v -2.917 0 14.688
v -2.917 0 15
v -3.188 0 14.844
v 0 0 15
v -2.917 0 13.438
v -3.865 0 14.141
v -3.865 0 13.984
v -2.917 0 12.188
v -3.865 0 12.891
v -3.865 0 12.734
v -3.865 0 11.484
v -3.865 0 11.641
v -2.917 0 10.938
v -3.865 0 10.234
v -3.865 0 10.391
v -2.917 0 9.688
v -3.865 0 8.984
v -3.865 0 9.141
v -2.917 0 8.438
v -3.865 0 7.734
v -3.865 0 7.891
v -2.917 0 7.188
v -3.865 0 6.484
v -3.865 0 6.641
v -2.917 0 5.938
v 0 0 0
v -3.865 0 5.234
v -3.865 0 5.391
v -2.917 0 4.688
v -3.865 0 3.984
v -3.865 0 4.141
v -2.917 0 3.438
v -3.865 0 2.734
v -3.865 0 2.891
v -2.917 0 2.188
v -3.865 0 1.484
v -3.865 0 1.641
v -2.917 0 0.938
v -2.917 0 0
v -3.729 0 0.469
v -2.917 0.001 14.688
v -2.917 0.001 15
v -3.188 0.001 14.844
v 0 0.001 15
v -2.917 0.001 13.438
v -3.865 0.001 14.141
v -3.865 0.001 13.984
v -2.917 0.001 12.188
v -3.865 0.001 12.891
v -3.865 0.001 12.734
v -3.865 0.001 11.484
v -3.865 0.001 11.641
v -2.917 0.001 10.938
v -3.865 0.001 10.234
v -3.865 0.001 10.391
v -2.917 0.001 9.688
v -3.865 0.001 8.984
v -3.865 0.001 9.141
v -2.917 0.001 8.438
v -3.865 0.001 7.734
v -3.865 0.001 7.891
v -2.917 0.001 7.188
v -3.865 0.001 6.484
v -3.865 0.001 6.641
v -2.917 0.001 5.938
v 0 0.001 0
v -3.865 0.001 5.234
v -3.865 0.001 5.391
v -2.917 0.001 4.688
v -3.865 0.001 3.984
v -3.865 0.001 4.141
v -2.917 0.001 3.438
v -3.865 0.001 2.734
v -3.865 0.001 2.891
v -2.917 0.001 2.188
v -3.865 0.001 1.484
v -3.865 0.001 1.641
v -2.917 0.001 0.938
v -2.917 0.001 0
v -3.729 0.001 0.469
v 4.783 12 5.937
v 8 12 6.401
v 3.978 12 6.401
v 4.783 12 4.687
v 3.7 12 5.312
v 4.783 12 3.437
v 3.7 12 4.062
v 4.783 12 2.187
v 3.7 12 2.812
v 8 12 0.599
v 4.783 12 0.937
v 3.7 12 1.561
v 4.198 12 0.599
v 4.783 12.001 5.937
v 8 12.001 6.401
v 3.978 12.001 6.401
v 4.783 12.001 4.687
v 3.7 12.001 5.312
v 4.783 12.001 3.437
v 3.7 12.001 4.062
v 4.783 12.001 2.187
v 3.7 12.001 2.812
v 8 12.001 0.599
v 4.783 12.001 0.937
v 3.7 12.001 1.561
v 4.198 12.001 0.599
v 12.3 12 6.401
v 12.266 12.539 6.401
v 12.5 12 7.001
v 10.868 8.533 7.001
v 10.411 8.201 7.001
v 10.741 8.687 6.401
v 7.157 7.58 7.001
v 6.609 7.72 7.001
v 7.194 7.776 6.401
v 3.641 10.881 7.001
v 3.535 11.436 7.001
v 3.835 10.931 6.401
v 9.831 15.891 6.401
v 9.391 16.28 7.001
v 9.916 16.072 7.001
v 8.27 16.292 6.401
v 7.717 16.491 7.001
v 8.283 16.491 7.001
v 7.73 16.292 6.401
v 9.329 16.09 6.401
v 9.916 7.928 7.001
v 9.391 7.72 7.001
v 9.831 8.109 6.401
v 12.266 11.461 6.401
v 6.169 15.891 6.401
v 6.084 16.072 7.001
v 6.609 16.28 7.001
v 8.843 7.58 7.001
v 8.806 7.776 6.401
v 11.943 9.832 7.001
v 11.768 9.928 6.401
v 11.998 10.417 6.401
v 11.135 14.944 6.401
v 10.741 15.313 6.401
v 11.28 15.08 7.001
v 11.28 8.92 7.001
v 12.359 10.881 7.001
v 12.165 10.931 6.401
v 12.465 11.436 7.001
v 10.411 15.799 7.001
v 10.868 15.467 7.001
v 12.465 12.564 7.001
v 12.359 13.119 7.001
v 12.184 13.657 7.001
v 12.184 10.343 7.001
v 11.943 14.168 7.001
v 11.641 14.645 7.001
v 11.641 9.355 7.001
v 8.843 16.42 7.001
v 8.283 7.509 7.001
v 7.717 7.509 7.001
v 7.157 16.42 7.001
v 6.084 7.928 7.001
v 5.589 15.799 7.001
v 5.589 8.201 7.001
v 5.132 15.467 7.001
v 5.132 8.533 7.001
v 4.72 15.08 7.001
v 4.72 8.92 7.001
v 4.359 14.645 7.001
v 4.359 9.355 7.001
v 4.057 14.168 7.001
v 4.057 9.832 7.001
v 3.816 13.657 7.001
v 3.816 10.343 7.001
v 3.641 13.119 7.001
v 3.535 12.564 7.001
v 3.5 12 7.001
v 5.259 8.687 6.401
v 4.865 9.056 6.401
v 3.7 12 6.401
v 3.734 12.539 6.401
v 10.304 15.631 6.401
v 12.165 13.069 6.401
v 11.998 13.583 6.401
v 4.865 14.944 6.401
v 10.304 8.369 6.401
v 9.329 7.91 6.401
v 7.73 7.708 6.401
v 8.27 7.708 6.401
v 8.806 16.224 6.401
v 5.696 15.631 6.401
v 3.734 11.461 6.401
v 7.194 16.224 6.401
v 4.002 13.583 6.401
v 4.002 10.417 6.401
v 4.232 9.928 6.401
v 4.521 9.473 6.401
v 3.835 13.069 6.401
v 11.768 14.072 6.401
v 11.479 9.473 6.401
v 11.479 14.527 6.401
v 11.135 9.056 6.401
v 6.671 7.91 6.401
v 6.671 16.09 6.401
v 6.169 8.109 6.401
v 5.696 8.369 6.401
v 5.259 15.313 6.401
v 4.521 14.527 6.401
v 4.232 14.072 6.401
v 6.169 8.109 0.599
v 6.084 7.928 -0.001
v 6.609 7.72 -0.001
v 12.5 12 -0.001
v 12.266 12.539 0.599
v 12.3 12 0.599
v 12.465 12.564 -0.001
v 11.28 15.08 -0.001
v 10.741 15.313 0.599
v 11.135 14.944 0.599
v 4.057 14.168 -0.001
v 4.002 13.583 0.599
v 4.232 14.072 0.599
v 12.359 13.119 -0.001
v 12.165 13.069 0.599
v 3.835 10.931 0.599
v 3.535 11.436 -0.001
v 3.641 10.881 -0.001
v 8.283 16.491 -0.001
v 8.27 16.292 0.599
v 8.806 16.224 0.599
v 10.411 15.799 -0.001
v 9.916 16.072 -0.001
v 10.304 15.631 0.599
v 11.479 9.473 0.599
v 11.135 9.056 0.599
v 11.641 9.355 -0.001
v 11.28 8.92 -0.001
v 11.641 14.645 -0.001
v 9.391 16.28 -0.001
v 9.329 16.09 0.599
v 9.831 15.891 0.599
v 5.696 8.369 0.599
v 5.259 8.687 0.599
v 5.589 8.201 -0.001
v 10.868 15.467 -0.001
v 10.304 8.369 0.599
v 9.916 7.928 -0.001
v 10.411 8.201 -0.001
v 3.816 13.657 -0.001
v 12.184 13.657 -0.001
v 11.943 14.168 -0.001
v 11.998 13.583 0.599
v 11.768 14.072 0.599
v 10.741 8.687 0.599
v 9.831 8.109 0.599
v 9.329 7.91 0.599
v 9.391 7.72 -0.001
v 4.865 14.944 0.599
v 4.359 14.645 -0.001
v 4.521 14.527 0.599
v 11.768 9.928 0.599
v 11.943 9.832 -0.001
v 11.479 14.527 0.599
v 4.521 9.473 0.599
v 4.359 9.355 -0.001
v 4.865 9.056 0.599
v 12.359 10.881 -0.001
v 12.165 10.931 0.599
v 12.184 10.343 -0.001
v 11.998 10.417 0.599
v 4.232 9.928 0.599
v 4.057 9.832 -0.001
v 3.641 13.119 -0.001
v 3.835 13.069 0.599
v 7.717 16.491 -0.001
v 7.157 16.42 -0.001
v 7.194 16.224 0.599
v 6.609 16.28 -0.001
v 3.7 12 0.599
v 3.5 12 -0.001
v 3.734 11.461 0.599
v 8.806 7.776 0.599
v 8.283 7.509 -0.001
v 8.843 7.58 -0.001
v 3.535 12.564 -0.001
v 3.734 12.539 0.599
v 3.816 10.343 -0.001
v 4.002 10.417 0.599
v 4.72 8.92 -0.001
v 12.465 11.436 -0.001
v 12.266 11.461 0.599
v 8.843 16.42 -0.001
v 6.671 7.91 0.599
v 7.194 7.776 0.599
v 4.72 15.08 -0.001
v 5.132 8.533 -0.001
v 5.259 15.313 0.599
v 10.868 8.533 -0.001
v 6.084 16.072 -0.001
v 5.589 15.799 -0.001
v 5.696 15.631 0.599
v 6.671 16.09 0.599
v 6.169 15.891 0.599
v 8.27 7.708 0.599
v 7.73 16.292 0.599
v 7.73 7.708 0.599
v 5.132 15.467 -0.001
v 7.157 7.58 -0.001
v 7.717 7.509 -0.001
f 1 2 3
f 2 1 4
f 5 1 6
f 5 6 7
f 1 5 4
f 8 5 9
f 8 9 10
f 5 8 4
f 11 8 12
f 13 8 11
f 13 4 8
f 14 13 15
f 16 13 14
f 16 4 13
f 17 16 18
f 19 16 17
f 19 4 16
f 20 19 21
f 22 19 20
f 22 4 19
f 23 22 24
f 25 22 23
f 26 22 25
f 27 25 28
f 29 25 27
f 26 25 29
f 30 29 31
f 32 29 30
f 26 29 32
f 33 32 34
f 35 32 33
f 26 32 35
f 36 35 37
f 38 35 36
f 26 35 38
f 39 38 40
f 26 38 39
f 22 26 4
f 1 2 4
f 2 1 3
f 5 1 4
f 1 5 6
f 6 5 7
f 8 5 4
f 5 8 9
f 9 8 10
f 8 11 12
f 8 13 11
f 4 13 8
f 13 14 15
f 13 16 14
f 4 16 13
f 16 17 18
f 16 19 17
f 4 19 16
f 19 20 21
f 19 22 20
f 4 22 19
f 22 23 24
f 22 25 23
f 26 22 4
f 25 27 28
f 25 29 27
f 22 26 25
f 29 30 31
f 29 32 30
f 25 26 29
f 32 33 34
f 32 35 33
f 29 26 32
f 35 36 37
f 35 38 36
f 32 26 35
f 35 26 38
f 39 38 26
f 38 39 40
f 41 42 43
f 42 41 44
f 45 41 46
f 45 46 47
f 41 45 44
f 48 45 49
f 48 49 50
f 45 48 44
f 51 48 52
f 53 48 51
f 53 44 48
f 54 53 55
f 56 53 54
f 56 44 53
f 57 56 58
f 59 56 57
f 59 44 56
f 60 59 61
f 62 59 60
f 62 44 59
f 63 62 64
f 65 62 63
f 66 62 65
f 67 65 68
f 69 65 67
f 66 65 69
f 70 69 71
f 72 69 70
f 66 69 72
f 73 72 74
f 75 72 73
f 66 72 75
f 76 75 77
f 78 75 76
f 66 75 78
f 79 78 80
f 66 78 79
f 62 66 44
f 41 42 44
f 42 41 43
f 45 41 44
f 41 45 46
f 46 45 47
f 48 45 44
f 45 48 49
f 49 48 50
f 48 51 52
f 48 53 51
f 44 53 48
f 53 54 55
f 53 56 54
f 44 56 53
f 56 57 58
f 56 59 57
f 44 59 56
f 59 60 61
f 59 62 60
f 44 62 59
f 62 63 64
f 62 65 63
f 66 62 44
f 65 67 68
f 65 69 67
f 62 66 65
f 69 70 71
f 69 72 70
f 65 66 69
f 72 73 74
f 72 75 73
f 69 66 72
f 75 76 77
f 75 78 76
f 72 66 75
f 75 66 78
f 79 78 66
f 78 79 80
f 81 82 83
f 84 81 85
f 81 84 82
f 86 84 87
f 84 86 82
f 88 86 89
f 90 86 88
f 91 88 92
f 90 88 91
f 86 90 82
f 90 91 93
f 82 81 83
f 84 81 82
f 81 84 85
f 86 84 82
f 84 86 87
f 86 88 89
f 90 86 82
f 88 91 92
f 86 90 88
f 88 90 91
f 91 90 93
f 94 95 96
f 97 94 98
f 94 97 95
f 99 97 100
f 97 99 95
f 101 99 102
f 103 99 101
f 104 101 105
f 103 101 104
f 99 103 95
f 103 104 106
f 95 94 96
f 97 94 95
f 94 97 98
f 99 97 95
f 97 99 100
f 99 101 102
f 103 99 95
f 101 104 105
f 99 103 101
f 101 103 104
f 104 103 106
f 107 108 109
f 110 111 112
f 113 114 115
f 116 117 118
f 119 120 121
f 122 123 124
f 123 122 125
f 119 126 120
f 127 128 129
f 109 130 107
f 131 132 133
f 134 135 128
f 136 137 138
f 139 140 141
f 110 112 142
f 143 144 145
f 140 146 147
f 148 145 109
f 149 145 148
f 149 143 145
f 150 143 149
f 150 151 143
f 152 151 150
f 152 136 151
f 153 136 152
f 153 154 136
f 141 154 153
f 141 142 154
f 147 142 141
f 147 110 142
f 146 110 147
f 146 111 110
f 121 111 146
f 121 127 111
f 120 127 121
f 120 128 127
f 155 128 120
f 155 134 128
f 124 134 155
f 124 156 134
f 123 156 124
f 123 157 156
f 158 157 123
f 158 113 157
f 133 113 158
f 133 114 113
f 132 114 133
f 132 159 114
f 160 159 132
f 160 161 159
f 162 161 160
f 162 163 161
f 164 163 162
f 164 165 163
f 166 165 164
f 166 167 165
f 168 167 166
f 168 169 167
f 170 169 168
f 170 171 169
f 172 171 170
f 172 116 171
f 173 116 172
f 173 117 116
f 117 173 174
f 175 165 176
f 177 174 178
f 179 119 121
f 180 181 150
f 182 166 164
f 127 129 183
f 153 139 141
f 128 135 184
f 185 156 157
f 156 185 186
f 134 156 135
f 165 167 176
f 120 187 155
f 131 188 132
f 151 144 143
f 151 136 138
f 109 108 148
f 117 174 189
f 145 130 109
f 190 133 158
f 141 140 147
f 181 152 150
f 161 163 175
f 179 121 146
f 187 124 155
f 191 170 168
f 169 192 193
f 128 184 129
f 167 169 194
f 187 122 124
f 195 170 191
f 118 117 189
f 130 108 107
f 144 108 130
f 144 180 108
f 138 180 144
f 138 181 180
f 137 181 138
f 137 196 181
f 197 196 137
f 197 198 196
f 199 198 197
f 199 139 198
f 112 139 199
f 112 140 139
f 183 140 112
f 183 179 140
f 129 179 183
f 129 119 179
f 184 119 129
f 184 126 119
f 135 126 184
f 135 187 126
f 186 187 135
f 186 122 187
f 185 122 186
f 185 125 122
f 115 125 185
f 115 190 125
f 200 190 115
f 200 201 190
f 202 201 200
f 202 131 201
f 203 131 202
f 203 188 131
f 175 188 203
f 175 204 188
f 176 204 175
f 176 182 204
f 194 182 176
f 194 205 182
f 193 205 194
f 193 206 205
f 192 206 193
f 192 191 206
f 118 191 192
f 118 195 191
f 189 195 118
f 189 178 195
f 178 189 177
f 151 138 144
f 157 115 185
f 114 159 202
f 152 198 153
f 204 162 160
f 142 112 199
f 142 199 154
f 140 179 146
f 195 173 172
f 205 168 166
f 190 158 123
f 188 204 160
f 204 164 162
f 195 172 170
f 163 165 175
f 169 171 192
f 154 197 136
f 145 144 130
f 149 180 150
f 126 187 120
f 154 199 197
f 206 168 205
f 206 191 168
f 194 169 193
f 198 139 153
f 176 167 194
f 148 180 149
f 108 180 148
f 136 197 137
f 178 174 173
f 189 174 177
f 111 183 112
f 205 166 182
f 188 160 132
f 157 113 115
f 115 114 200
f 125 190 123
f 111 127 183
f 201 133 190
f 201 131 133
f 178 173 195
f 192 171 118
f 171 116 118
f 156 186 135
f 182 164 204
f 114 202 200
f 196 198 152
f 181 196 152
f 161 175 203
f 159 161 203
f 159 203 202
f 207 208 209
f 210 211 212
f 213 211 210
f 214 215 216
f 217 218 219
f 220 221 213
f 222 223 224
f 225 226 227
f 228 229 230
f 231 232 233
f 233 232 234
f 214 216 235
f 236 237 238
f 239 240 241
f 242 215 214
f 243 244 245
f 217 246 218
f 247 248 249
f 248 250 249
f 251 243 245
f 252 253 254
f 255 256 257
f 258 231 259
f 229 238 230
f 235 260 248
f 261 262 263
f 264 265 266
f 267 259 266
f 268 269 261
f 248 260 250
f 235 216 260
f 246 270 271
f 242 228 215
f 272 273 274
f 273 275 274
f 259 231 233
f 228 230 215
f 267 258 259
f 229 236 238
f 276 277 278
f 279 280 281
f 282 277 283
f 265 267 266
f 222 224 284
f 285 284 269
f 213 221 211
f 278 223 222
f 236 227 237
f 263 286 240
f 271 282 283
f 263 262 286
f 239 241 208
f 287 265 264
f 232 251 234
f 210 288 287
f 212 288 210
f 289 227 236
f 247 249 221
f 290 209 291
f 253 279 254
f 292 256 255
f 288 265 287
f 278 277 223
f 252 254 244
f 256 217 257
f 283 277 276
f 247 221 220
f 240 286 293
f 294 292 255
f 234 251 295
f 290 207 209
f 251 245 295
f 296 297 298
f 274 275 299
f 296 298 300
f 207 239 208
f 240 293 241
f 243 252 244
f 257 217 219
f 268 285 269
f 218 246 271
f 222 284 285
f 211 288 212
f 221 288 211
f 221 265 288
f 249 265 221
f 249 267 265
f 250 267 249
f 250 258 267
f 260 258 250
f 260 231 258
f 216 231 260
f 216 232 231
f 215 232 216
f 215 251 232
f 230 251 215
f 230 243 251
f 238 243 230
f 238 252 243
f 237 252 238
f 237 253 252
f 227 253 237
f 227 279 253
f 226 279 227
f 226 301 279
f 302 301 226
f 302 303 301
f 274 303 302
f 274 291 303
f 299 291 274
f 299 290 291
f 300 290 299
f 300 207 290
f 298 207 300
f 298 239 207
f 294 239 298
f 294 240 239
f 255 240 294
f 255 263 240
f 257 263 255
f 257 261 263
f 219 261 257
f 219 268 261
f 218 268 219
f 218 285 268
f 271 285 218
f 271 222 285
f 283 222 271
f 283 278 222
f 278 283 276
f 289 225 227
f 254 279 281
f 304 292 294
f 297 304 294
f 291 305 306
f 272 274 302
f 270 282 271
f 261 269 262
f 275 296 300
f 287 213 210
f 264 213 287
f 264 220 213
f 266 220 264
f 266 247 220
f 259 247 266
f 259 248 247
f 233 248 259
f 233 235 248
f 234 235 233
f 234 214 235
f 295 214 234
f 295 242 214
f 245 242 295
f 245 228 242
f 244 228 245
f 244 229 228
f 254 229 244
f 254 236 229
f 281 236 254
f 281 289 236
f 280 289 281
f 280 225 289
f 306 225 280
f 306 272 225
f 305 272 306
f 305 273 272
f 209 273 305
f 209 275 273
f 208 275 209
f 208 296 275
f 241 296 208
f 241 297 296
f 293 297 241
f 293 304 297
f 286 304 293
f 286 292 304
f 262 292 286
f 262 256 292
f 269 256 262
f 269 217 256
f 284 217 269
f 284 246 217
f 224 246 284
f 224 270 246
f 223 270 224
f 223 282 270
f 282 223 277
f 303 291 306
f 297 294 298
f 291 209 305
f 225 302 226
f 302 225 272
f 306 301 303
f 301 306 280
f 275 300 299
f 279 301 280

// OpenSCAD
/*
"OpenScad library. Threads for screws and nuts V1" 
by ANDRES ROMAN (AKA Cuiso) September 2018

-> V1.1 23/08/2019 Change Log:
-Fixed bug. Using fullparms functions with "divs" no divider of 360 (200 for example) the thread could be incomplete. Now you can use any number of "divs" without problem.
-A small improvement. Now the diameter reductions at the beginning of the screw for easy entry are created with the same level of detail as the rest of the screw.

* Copyright 2018 ANDRES ROMAN (AKA Cuiso)
* Licensed under the Creative Commons - Attribution license.
* This software is free software, you can Share and Adapt under the terms of Attribution
(give appropriate credit).
*   
* you can visit https://creativecommons.org/licenses/by/3.0/ for more details

* This software is distributed WITHOUT ANY WARRANTY.

*/

//For use this library you can put the file threads-library-by-cuiso-v1.scad in the same directory of your proyect and put the line use <threads-library-by-cuiso-v1.scad> in your own .scad file
//You can see examples of use in file examples.scad

/*
This is a library to include threads for screws and nuts in your own designs.

This library is focused to provide simple functions with preset parameters by default,
and not to be too demanding in CPU consumption neither in previsualizacion nor in rendering

This library has been tested printing on PLA with 0.1 layer. Except for smaller diameter
threads layers greater than 0.1 should work well.
Diamaters tested between 3mm and 10mm, but you can use any diameter of your choice. 

Shape of the threads are similar (but not equal) to ISO METRIC threads.
Some tests have been done using screws and nuts printed with this library in
combination with screws and nuts of metal with acceptable results. However, they have
not been exhaustive tests.
*/

/*
>>>>>>>>>>>>>>>>>>>>>>>>>>>>>>>>>>>>>>>>>>>>>>>>>>>>>>
AVAILABLE FUNCTIONS:

BASIC FUNCTIONS (USING PREDEFINED PARAMETERS):

thread_for_screw(diameter, length);
    Generates a screw thread of the diameter indicated by the "diameter" parameter and of the length indicated by "length". This function uses standard pitch values depending on the diameter specified.
    diameter: Free value, in milimeters.
    length: Free value, in milimeters.
    
    Example:
    thread_for_screw(diameter=10, length=30);

thread_for_nut(diameter, length, usrclearance=0);
    Generates a nut thread of the diameter indicated by the "diameter" parameter and of the length indicated by "length". This function uses standard pitch values depending on the diameter specified.
    The generated thread can be subtracted from any element of your design using the operator "difference()", thus obtaining a thread where a screw will fit.
    This function uses standard clearance for adjustment between screw and nut depending on the diameter specified.
    diameter: Free value, in milimeters.
    length: Free value, in milimeters.
    usrclearance: (optional) If the screw fits too tight on the nut you can specify a positive correction value (try 0.1 for example).
    If the screw fits too loose in the nut you can specify a negative correction value (try -0.1 for example).
    
    Example:
    thread_for_nut(diameter=10, length=20);
    

MORE AVAILABLE FUNCTIONS (WITH ADDITIONAL PARAMETERS):

thread_for_screw_fullparm(diameter, length, pitch, divs=50);
    Generates a screw thread of the diameter indicated by the "diameter" parameter and of the length indicated by "length", with pitch indicated by "pitch", and a resolution indicated by "divs". 
    This function allows you to specify a non-standard "pitch" value.
    diameter: Free value, in milimeters.
    length: Free value, in milimeters.
    pitch: Pitch value.
    divs: (optional) you can obtain more or less resolution with parm. Higher values for more resolution (and more rendering time). Default value is 50.
        
    Example:
    thread_for_screw_fullparm(diameter=10, length=30, pitch=2, divs=60);

thread_for_nut_fullparm(diameter, length, usrclearance=0, pitch, divs=50, entry=1);
    Generates a nut thread with additional parameters:
    diameter: Free value, in milimeters.
    length: Free value, in milimeters.
    usrclearance: (optional) If the screw fits too tight on the nut you can specify a positive correction value (try 0.1 for example).
    If the screw fits too loose in the nut you can specify a negative correction value (try -0.1 for example).
    pitch: Pitch value.
    divs: (optional) you can obtain more or less resolution with parm. Higher values for more resolution (and more rendering time). Default value is 50.
    entry: By default, the nut threads include a wider entrance area at the beginning and end to facilitate the introduction of the screw and minimize "elephant foot" problems.
    Specify 1 in entry to use these zones and 0 to not use them.
    
    Example:
    thread_for_nut_fullparm(diameter=10,length=20,usrclearance=0.1,pitch=1.5,divs=60, entry=1);
>>>>>>>>>>>>>>>>>>>>>>>>>>>>>>>>>>>>>>>>>>>>>>>>>>>>>>
*/   

/*
>>>>>>>>>>>>>>>>>>>>>>>>>>>>>>>>>>>>>>>>>>>>>>>>>>>>>>
SOME NOTES:
- At first preview(F5) of the design may appear in console a lot of messages:
"PolySet has nonplanar faces. Attempting alternate construction"
simply ignore those messages, they are not a problem.

- I have no lag problems in preview(F5) mode during the test of this library. If you are suffering lag problems in preview you can try to un-comment the "render()" al lines 254 and 261.  

- This library uses by default PITCH values: 
  DIAMETER    PITCH_VALUE
  3mm        0.5mm
  4mm        0.7mm
  5mm        0.8mm
  6mm        1.0mm
  8mm        1.25mm
 10mm        1.5mm
 ...
 24mm        3.0mm
 (complete list defined at get_std_pitch(diam))
>>>>>>>>>>>>>>>>>>>>>>>>>>>>>>>>>>>>>>>>>>>>>>>>>>>>>>
*/


//EXAMPLE FOR CUSTOMIZER:
//1 to draw rod, 0 to not draw rod
drawrod=1; 
//1 to draw nut, 0 to not draw nut
drawnut=1;
diameter=8; 
lengthrod=15; 
lengthnut=7; 
//Example of USE, a rod SCREW:
if(drawrod==1)thread_for_screw(diameter=diameter, length=lengthrod);
//Example of USE, a FEMALE THREAD to be removed (with difference ()) from another figure:
if(drawnut==1)
translate([diameter,1.5*diameter,0]){
thread_for_nut(diameter=diameter, length=lengthnut);
}




//>>>>>>>>>>>>>>>>>>>>>>>>>>>>>>>>>>>>>>>>>>>>>>>>>>>>>>>>>>>>>>>>>>>>>>>>>>>>>>>>>>>
module thread_for_screw(diameter, length)
{
stdpitch=get_std_pitch(diameter);
thread_for_screw_cuiso_tec(diameter,length,stdpitch,50);
echo(diameter);echo(stdpitch);
}

module thread_for_nut(diameter, length, usrclearance=0)
{
stdpitch=get_std_pitch(diameter);
stdclearance=get_std_clearance(diameter);

thread_for_nut_cuiso_tec
(diameter+stdclearance+usrclearance,length,stdpitch,50,entry=1);
    
echo(diameter);echo(stdpitch);echo(stdclearance+usrclearance);
}

//>>>>>>>>>>>>>>>>>>>>>>>>>>>>>>>>>>>>>>>>>>>>>>>>>>>>>>>>>>>>>>>>>>>>>>>>>>>>>>>>>>>
module thread_for_screw_fullparm(diameter, length, pitch, divs=50)
{
if(divs<20) thread_for_screw_cuiso_tec(diameter,length,pitch,20);
    else if(divs>360) thread_for_screw_cuiso_tec(diameter,length,pitch,360);
        else thread_for_screw_cuiso_tec(diameter,length,pitch,divs);
}

module thread_for_nut_fullparm(diameter, length, usrclearance=0, pitch, divs=50, entry=1)
{
stdclearance=get_std_clearance(diameter);

if(divs<20)thread_for_nut_cuiso_tec
(diameter+stdclearance+usrclearance,length,pitch,20,entry=entry);
else
if(divs>360)thread_for_nut_cuiso_tec
(diameter+stdclearance+usrclearance,length,pitch,360,entry=entry);
else
thread_for_nut_cuiso_tec
(diameter+stdclearance+usrclearance,length,pitch,divs,entry=entry);
}

//>>>>>>>>>>>>>>>>>>>>>>>>>>>>>>>>>>>>>>>>>>>>>>>>>>>>>>>>>>>>>>>>>>>>>>>>>>>>>>>>>>>
function get_std_pitch(diam) = 
lookup(diam,[[3,0.5],[4,0.7],[5,0.8],[6,1.0],[8,1.25],[10,1.5],
[12,1.75],[14,2.0],[16,2.0],[18,2.5],[20,2.5],[22,2.5],[24,3.0]
]);

function get_std_clearance(diam) = 
lookup(diam,[[3,0.4],[4,0.4],[5,0.5],[6,0.6],[8,0.6],[10,0.6],
[12,0.7],[14,0.7],[16,0.7],[18,0.7],[20,0.8],[22,0.8],[24,0.8]
]);
//>>>>>>>>>>>>>>>>>>>>>>>>>>>>>>>>>>>>>>>>>>>>>>>>>>>>>>>>>>>>>>>>>>>>>>>>>>>>>>>>>>>
module thread_for_screw_cuiso_tec(diameter,lenght,pitch,divdelta){
delta=360/divdelta;
intersection(){
cubointter(long=lenght,pitch=pitch,diameter=diameter,divdeltacube=divdelta);
rosca(long=lenght,p=pitch,delta=delta,diameter=diameter);
}
//#cylinder(d=diameter,h=lenght,$fn=100);
}

module thread_for_nut_cuiso_tec(diameter,lenght,pitch,divdelta,entry){
delta=360/divdelta;
translate([0,0,-0.001])
intersection(){
rosca(long=lenght+0.002,p=pitch,delta=delta,diameter=diameter,nut=1);
cubointter_nut(lenght+0.002,pitch,diameter);
}
if(entry==1){translate([0,0,-0.001])cubointter_nut_entry(lenght+0.002,pitch,diameter,divdeltacube=divdelta);}
//#cylinder(d=diameter,h=lenght,$fn=100);
}

module cubointter(long,pitch,diameter,divdeltacube)
{
longcube=long-pitch;
translate([0,0,longcube/2+pitch/2])cube([diameter,diameter,longcube],center=true);
translate([0,0,longcube+pitch/2])
cylinder(d1=diameter,d2=diameter-2*pitch*0.866,h=pitch/2, $fn=divdeltacube);
cylinder(d2=diameter,d1=diameter-2*pitch*0.866,h=pitch/2, $fn=divdeltacube);
}

module cubointter_nut(long,pitch,diameter)
{
longcube=long;
translate([0,0,longcube/2])cube([diameter,diameter,longcube],center=true);
}

module cubointter_nut_entry(long,pitch,diameter,divdeltacube)
{
longcube=long-0.6;
translate([0,0,longcube])
cylinder(d2=diameter+0.4,d1=diameter,h=0.6, $fn=divdeltacube);
cylinder(d1=diameter+0.4,d2=diameter,h=0.6, $fn=divdeltacube);
}

module rosca(long,p,delta,diameter,nut=0)
{
vueltas=round(long/p+0.5)+1;
translate([0,0,-p/4])
for(v = [0 : 1 : vueltas-1])
translate([0,0,v*p])
vuelta(p=p,delta=delta,diameter=diameter,nut=nut);
}

module vuelta(p,delta,diameter,nut)
{
medio(p=p,delta=delta,diameter=diameter,nut=nut);

translate([0,0.001,0])
rotate([0,180,180])
medio(p=p,delta=delta,diameter=diameter,nut=nut);
}

module medio(p,delta,diameter,nut)
{
if(nut==1)
//render()
hull(){
for(k = [0 : delta : 180])
translate([0,0,k*p/360])rotate([0,0,k])pieza_nut(diameter=diameter, p=p);
translate([0,0,180*p/360])rotate([0,0,180])pieza_nut(diameter=diameter, p=p);
}
else
//render()
hull(){
for(k = [0 : delta : 180])
translate([0,0,k*p/360])rotate([0,0,k])pieza(diameter=diameter, p=p);
translate([0,0,180*p/360])rotate([0,0,180])pieza(diameter=diameter, p=p);
}
}

module pieza(diameter, p)
{
r=diameter/2;
h=p*0.866;
pp=p/2;
pm=-p/2;
hh=r-h;

polyhedron([
    [0,0,pp],[hh,0,pp],[r-h/8,0,p/16],[r-h/8,0,-p/16],[hh,0,pm],[0,0,pm]
    ], 
    [[0,1,2,3,4,5]]);
}

module pieza_nut(diameter, p)
{
r=diameter/2;
h=p*0.866;
pp=p/2;
pm=-p/2;
hh=r-h;
polyhedron([[0,0,pp],[hh,0,pp],[r,0,0],[hh,0,pm],[0,0,pm]], [[0,1,2,3,4]]);
}
